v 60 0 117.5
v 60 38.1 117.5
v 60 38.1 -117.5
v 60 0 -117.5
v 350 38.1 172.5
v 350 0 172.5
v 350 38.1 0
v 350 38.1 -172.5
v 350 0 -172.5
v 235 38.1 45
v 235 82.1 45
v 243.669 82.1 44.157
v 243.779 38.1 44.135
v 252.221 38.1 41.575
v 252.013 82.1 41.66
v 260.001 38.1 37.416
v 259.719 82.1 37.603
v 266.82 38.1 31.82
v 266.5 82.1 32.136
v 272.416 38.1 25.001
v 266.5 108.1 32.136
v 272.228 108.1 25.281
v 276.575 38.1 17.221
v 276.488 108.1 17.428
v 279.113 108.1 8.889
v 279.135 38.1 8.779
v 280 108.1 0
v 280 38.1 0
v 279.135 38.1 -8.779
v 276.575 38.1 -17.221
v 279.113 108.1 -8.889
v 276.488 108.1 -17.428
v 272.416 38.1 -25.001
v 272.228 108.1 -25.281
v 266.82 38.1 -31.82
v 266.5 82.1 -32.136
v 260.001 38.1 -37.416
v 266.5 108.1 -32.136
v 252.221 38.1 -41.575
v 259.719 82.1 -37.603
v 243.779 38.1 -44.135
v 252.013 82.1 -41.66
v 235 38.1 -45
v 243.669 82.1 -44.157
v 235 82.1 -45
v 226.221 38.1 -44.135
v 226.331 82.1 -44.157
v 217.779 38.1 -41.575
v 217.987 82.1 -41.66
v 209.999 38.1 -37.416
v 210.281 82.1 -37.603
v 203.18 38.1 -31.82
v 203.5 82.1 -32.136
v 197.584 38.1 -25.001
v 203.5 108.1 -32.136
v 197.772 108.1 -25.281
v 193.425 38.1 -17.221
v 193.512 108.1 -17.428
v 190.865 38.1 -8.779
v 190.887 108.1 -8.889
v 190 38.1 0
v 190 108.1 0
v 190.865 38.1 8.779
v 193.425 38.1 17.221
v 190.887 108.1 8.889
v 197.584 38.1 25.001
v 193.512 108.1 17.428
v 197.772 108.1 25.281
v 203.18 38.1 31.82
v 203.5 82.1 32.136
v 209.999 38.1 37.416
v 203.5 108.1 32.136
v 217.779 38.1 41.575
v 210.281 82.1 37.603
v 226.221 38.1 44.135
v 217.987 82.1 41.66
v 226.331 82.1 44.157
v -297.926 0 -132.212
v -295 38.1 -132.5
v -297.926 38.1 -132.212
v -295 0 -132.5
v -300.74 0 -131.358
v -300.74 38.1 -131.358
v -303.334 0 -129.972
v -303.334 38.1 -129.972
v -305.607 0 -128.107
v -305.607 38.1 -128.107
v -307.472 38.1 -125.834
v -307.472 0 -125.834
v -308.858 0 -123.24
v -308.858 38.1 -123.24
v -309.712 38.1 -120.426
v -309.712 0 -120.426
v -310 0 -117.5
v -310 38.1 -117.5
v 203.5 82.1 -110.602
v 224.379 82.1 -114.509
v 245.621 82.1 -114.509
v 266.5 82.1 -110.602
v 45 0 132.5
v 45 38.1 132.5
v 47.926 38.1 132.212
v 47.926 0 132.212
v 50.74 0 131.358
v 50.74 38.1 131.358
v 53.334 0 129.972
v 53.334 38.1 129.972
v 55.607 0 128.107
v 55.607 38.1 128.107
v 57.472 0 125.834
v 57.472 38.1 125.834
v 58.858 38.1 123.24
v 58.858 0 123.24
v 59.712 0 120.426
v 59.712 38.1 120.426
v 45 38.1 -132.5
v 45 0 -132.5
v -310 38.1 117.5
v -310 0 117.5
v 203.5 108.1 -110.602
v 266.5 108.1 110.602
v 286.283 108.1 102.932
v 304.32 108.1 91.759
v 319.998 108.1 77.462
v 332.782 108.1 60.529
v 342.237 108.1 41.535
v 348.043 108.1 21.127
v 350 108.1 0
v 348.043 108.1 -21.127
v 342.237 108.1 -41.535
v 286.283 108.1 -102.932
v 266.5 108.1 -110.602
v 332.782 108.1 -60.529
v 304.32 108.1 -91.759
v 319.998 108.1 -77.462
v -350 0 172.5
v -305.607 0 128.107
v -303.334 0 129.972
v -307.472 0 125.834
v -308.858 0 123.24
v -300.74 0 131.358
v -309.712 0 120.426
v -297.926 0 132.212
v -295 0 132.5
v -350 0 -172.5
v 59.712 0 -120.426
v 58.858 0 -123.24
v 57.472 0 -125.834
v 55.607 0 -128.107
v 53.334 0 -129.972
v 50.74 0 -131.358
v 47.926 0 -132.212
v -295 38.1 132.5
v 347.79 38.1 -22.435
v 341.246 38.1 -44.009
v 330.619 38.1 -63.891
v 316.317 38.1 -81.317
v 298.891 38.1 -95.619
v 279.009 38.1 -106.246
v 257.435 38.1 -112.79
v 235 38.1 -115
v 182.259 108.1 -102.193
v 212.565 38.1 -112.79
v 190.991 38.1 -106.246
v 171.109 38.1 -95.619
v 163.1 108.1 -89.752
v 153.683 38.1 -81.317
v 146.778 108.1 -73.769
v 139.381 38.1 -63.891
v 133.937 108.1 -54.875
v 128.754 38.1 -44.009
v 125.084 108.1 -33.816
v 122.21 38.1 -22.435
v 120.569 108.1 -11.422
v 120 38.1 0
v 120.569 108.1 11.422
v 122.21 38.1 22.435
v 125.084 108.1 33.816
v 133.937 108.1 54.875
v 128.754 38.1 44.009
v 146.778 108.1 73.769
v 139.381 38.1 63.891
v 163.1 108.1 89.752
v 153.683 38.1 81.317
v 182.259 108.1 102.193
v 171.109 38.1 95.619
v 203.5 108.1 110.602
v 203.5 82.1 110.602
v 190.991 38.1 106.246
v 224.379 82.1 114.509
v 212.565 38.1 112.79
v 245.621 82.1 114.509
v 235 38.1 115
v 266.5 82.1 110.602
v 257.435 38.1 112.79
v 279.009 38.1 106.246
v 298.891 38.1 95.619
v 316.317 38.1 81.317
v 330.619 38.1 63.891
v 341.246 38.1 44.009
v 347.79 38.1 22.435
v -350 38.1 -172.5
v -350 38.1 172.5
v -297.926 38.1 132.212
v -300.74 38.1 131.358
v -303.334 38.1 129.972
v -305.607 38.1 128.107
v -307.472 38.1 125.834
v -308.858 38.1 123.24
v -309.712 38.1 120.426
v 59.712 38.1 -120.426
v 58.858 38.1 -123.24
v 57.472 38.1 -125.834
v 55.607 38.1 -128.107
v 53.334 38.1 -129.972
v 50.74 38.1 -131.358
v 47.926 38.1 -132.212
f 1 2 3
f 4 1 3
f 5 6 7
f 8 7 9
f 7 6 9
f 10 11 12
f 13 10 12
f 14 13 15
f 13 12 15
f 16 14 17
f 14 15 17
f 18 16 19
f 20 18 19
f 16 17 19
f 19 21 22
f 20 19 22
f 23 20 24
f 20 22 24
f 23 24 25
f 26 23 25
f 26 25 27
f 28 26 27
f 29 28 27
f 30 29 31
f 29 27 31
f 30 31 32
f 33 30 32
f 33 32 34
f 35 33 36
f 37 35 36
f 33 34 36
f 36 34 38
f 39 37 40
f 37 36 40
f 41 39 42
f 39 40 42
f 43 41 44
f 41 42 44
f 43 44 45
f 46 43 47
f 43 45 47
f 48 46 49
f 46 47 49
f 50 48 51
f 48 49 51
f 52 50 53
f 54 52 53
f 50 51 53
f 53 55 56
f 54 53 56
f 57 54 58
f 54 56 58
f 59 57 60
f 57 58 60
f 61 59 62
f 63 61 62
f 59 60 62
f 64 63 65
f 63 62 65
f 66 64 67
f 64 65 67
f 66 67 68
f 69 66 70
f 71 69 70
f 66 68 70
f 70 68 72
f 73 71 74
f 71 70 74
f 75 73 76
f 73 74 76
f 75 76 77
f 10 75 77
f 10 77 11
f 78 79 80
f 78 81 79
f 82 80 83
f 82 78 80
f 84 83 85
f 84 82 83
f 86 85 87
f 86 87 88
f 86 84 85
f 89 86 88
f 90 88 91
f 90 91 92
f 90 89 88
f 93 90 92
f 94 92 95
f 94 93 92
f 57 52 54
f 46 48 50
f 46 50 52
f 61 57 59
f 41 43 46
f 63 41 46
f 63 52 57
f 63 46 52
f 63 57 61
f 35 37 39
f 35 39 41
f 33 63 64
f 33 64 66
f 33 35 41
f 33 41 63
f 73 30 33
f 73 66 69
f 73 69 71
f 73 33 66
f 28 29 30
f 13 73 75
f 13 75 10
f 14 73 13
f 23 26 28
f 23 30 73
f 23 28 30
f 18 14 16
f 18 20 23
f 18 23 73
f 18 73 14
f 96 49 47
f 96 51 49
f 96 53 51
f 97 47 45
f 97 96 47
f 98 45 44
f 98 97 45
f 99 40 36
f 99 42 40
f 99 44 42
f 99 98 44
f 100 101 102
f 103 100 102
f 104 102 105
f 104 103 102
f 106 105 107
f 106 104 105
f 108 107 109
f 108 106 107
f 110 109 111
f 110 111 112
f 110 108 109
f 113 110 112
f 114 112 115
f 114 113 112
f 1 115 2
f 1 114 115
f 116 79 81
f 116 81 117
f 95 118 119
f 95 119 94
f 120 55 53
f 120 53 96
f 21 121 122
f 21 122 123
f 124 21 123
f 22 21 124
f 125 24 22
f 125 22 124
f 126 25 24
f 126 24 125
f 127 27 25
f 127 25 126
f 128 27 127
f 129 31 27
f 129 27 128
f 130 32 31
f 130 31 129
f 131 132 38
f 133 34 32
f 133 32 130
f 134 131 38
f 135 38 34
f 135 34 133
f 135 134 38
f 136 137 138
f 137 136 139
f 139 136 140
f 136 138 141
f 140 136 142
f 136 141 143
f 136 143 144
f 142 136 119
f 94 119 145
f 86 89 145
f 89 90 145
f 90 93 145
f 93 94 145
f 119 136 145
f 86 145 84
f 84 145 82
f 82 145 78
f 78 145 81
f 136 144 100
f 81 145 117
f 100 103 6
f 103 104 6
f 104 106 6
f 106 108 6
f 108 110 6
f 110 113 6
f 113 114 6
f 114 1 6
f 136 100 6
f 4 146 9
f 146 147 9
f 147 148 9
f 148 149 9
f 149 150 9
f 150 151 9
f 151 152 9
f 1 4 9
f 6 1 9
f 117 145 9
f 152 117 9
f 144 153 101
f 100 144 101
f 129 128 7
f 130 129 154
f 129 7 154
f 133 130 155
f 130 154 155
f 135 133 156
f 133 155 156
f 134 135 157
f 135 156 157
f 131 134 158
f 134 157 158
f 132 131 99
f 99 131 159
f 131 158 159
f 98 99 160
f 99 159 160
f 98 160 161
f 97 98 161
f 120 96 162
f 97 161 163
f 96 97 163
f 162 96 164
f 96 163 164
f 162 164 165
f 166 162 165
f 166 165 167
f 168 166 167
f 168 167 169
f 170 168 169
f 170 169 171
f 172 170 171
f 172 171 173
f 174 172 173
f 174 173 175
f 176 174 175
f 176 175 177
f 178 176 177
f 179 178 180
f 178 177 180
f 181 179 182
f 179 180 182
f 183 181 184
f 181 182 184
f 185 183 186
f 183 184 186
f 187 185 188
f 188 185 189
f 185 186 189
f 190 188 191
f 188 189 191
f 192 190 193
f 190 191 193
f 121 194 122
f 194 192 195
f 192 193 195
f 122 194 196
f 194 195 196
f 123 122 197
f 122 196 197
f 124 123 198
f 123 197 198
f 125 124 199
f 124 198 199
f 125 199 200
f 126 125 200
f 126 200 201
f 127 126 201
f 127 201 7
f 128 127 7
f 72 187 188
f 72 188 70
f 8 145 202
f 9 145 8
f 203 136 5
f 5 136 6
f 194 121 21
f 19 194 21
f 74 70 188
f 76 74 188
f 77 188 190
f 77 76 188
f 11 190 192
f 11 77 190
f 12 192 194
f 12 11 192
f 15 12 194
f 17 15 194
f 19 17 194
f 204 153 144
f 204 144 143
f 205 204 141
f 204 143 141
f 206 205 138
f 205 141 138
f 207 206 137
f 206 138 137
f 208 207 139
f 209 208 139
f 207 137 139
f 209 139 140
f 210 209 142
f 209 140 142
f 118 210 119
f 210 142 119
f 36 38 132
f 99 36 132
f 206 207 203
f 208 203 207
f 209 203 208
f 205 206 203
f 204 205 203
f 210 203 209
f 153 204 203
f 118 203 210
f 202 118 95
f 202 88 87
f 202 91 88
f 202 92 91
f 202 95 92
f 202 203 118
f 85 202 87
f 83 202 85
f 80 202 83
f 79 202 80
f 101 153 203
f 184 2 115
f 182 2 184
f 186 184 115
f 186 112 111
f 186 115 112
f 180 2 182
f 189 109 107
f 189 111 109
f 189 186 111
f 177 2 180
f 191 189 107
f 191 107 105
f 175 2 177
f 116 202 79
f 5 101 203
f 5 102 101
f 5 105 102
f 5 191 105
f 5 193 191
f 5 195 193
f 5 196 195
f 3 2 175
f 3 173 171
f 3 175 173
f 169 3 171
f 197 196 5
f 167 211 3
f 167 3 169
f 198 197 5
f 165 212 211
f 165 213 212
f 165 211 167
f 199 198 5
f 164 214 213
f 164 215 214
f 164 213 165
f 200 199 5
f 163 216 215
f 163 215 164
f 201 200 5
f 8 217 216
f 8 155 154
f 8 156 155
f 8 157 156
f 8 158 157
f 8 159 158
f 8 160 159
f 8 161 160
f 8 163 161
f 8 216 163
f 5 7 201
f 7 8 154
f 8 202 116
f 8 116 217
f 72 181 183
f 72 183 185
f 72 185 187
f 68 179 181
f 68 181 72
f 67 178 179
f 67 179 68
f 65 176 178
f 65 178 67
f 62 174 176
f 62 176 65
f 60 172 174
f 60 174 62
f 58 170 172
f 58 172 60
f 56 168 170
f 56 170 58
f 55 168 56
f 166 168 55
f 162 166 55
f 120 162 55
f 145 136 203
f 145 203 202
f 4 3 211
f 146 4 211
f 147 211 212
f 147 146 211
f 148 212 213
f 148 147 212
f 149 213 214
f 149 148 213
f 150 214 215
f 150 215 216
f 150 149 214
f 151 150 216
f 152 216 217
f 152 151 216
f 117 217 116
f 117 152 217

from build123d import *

# Parameters (mm, degrees)
CROQUIS1_W              = 700
CROQUIS1_H              = 345
SALIENTE_EXTRUIR1_DEPTH = 38.1
CROQUIS2_W              = 370
CROQUIS2_H              = 265
CORTAR_EXTRUIR1_DEPTH   = 38.1
REDONDEO1_R             = 15
CROQUIS3_R              = 115
SALIENTE_EXTRUIR2_DEPTH = 70
CROQUIS4_R              = 45
CORTAR_EXTRUIR2_DEPTH   = 70
CROQUIS5_W              = 63
CROQUIS5_H              = 247.074165674
CORTAR_EXTRUIR3_DEPTH   = 26


with BuildPart() as part:
    # Croquis1 → Saliente-Extruir1 (new body)
    with BuildSketch(Plane(origin=(0, 0, 0), x_dir=(1, 0, 0), z_dir=(0, 1, 0))):
        Rectangle(CROQUIS1_W, CROQUIS1_H)
    extrude(amount=SALIENTE_EXTRUIR1_DEPTH)

    # Croquis2 → Cortar-Extruir1 (cut)
    with BuildSketch(Plane(origin=(0, 38.1, 0), x_dir=(1, 0, 0), z_dir=(0, 1, 0))):
        with Locations((-125, 0)):
            Rectangle(CROQUIS2_W, CROQUIS2_H)
    extrude(amount=-CORTAR_EXTRUIR1_DEPTH, mode=Mode.SUBTRACT)

    # Redondeo1
    redondeo1_edges = [part.edges().sort_by_distance(p)[0] for p in [
        (-310, 19.05, 132.5),
        (-310, 19.05, -132.5),
        (60, 19.05, -132.5),
        (60, 19.05, 132.5),
    ]]
    fillet(redondeo1_edges, radius=REDONDEO1_R)

    # Croquis3 → Saliente-Extruir2 (add)
    with BuildSketch(Plane(origin=(0, 38.1, 0), x_dir=(1, 0, 0), z_dir=(0, 1, 0))):
        with Locations((235, 0)):
            Circle(CROQUIS3_R)
    extrude(amount=SALIENTE_EXTRUIR2_DEPTH)

    # Croquis4 → Cortar-Extruir2 (cut)
    with BuildSketch(Plane(origin=(0, 108.1, 0), x_dir=(1, 0, 0), z_dir=(0, 1, 0))):
        with Locations(Location((235, 0, 0), (0, 0, 270))):
            Circle(CROQUIS4_R)
    extrude(amount=-CORTAR_EXTRUIR2_DEPTH, mode=Mode.SUBTRACT)

    # Croquis5 → Cortar-Extruir3 (cut)
    with BuildSketch(Plane(origin=(0, 108.1, 0), x_dir=(1, 0, 0), z_dir=(0, 1, 0))):
        with Locations((235, 0)):
            Rectangle(CROQUIS5_W, CROQUIS5_H)
    extrude(amount=-CORTAR_EXTRUIR3_DEPTH, mode=Mode.SUBTRACT)


solid = part.part
